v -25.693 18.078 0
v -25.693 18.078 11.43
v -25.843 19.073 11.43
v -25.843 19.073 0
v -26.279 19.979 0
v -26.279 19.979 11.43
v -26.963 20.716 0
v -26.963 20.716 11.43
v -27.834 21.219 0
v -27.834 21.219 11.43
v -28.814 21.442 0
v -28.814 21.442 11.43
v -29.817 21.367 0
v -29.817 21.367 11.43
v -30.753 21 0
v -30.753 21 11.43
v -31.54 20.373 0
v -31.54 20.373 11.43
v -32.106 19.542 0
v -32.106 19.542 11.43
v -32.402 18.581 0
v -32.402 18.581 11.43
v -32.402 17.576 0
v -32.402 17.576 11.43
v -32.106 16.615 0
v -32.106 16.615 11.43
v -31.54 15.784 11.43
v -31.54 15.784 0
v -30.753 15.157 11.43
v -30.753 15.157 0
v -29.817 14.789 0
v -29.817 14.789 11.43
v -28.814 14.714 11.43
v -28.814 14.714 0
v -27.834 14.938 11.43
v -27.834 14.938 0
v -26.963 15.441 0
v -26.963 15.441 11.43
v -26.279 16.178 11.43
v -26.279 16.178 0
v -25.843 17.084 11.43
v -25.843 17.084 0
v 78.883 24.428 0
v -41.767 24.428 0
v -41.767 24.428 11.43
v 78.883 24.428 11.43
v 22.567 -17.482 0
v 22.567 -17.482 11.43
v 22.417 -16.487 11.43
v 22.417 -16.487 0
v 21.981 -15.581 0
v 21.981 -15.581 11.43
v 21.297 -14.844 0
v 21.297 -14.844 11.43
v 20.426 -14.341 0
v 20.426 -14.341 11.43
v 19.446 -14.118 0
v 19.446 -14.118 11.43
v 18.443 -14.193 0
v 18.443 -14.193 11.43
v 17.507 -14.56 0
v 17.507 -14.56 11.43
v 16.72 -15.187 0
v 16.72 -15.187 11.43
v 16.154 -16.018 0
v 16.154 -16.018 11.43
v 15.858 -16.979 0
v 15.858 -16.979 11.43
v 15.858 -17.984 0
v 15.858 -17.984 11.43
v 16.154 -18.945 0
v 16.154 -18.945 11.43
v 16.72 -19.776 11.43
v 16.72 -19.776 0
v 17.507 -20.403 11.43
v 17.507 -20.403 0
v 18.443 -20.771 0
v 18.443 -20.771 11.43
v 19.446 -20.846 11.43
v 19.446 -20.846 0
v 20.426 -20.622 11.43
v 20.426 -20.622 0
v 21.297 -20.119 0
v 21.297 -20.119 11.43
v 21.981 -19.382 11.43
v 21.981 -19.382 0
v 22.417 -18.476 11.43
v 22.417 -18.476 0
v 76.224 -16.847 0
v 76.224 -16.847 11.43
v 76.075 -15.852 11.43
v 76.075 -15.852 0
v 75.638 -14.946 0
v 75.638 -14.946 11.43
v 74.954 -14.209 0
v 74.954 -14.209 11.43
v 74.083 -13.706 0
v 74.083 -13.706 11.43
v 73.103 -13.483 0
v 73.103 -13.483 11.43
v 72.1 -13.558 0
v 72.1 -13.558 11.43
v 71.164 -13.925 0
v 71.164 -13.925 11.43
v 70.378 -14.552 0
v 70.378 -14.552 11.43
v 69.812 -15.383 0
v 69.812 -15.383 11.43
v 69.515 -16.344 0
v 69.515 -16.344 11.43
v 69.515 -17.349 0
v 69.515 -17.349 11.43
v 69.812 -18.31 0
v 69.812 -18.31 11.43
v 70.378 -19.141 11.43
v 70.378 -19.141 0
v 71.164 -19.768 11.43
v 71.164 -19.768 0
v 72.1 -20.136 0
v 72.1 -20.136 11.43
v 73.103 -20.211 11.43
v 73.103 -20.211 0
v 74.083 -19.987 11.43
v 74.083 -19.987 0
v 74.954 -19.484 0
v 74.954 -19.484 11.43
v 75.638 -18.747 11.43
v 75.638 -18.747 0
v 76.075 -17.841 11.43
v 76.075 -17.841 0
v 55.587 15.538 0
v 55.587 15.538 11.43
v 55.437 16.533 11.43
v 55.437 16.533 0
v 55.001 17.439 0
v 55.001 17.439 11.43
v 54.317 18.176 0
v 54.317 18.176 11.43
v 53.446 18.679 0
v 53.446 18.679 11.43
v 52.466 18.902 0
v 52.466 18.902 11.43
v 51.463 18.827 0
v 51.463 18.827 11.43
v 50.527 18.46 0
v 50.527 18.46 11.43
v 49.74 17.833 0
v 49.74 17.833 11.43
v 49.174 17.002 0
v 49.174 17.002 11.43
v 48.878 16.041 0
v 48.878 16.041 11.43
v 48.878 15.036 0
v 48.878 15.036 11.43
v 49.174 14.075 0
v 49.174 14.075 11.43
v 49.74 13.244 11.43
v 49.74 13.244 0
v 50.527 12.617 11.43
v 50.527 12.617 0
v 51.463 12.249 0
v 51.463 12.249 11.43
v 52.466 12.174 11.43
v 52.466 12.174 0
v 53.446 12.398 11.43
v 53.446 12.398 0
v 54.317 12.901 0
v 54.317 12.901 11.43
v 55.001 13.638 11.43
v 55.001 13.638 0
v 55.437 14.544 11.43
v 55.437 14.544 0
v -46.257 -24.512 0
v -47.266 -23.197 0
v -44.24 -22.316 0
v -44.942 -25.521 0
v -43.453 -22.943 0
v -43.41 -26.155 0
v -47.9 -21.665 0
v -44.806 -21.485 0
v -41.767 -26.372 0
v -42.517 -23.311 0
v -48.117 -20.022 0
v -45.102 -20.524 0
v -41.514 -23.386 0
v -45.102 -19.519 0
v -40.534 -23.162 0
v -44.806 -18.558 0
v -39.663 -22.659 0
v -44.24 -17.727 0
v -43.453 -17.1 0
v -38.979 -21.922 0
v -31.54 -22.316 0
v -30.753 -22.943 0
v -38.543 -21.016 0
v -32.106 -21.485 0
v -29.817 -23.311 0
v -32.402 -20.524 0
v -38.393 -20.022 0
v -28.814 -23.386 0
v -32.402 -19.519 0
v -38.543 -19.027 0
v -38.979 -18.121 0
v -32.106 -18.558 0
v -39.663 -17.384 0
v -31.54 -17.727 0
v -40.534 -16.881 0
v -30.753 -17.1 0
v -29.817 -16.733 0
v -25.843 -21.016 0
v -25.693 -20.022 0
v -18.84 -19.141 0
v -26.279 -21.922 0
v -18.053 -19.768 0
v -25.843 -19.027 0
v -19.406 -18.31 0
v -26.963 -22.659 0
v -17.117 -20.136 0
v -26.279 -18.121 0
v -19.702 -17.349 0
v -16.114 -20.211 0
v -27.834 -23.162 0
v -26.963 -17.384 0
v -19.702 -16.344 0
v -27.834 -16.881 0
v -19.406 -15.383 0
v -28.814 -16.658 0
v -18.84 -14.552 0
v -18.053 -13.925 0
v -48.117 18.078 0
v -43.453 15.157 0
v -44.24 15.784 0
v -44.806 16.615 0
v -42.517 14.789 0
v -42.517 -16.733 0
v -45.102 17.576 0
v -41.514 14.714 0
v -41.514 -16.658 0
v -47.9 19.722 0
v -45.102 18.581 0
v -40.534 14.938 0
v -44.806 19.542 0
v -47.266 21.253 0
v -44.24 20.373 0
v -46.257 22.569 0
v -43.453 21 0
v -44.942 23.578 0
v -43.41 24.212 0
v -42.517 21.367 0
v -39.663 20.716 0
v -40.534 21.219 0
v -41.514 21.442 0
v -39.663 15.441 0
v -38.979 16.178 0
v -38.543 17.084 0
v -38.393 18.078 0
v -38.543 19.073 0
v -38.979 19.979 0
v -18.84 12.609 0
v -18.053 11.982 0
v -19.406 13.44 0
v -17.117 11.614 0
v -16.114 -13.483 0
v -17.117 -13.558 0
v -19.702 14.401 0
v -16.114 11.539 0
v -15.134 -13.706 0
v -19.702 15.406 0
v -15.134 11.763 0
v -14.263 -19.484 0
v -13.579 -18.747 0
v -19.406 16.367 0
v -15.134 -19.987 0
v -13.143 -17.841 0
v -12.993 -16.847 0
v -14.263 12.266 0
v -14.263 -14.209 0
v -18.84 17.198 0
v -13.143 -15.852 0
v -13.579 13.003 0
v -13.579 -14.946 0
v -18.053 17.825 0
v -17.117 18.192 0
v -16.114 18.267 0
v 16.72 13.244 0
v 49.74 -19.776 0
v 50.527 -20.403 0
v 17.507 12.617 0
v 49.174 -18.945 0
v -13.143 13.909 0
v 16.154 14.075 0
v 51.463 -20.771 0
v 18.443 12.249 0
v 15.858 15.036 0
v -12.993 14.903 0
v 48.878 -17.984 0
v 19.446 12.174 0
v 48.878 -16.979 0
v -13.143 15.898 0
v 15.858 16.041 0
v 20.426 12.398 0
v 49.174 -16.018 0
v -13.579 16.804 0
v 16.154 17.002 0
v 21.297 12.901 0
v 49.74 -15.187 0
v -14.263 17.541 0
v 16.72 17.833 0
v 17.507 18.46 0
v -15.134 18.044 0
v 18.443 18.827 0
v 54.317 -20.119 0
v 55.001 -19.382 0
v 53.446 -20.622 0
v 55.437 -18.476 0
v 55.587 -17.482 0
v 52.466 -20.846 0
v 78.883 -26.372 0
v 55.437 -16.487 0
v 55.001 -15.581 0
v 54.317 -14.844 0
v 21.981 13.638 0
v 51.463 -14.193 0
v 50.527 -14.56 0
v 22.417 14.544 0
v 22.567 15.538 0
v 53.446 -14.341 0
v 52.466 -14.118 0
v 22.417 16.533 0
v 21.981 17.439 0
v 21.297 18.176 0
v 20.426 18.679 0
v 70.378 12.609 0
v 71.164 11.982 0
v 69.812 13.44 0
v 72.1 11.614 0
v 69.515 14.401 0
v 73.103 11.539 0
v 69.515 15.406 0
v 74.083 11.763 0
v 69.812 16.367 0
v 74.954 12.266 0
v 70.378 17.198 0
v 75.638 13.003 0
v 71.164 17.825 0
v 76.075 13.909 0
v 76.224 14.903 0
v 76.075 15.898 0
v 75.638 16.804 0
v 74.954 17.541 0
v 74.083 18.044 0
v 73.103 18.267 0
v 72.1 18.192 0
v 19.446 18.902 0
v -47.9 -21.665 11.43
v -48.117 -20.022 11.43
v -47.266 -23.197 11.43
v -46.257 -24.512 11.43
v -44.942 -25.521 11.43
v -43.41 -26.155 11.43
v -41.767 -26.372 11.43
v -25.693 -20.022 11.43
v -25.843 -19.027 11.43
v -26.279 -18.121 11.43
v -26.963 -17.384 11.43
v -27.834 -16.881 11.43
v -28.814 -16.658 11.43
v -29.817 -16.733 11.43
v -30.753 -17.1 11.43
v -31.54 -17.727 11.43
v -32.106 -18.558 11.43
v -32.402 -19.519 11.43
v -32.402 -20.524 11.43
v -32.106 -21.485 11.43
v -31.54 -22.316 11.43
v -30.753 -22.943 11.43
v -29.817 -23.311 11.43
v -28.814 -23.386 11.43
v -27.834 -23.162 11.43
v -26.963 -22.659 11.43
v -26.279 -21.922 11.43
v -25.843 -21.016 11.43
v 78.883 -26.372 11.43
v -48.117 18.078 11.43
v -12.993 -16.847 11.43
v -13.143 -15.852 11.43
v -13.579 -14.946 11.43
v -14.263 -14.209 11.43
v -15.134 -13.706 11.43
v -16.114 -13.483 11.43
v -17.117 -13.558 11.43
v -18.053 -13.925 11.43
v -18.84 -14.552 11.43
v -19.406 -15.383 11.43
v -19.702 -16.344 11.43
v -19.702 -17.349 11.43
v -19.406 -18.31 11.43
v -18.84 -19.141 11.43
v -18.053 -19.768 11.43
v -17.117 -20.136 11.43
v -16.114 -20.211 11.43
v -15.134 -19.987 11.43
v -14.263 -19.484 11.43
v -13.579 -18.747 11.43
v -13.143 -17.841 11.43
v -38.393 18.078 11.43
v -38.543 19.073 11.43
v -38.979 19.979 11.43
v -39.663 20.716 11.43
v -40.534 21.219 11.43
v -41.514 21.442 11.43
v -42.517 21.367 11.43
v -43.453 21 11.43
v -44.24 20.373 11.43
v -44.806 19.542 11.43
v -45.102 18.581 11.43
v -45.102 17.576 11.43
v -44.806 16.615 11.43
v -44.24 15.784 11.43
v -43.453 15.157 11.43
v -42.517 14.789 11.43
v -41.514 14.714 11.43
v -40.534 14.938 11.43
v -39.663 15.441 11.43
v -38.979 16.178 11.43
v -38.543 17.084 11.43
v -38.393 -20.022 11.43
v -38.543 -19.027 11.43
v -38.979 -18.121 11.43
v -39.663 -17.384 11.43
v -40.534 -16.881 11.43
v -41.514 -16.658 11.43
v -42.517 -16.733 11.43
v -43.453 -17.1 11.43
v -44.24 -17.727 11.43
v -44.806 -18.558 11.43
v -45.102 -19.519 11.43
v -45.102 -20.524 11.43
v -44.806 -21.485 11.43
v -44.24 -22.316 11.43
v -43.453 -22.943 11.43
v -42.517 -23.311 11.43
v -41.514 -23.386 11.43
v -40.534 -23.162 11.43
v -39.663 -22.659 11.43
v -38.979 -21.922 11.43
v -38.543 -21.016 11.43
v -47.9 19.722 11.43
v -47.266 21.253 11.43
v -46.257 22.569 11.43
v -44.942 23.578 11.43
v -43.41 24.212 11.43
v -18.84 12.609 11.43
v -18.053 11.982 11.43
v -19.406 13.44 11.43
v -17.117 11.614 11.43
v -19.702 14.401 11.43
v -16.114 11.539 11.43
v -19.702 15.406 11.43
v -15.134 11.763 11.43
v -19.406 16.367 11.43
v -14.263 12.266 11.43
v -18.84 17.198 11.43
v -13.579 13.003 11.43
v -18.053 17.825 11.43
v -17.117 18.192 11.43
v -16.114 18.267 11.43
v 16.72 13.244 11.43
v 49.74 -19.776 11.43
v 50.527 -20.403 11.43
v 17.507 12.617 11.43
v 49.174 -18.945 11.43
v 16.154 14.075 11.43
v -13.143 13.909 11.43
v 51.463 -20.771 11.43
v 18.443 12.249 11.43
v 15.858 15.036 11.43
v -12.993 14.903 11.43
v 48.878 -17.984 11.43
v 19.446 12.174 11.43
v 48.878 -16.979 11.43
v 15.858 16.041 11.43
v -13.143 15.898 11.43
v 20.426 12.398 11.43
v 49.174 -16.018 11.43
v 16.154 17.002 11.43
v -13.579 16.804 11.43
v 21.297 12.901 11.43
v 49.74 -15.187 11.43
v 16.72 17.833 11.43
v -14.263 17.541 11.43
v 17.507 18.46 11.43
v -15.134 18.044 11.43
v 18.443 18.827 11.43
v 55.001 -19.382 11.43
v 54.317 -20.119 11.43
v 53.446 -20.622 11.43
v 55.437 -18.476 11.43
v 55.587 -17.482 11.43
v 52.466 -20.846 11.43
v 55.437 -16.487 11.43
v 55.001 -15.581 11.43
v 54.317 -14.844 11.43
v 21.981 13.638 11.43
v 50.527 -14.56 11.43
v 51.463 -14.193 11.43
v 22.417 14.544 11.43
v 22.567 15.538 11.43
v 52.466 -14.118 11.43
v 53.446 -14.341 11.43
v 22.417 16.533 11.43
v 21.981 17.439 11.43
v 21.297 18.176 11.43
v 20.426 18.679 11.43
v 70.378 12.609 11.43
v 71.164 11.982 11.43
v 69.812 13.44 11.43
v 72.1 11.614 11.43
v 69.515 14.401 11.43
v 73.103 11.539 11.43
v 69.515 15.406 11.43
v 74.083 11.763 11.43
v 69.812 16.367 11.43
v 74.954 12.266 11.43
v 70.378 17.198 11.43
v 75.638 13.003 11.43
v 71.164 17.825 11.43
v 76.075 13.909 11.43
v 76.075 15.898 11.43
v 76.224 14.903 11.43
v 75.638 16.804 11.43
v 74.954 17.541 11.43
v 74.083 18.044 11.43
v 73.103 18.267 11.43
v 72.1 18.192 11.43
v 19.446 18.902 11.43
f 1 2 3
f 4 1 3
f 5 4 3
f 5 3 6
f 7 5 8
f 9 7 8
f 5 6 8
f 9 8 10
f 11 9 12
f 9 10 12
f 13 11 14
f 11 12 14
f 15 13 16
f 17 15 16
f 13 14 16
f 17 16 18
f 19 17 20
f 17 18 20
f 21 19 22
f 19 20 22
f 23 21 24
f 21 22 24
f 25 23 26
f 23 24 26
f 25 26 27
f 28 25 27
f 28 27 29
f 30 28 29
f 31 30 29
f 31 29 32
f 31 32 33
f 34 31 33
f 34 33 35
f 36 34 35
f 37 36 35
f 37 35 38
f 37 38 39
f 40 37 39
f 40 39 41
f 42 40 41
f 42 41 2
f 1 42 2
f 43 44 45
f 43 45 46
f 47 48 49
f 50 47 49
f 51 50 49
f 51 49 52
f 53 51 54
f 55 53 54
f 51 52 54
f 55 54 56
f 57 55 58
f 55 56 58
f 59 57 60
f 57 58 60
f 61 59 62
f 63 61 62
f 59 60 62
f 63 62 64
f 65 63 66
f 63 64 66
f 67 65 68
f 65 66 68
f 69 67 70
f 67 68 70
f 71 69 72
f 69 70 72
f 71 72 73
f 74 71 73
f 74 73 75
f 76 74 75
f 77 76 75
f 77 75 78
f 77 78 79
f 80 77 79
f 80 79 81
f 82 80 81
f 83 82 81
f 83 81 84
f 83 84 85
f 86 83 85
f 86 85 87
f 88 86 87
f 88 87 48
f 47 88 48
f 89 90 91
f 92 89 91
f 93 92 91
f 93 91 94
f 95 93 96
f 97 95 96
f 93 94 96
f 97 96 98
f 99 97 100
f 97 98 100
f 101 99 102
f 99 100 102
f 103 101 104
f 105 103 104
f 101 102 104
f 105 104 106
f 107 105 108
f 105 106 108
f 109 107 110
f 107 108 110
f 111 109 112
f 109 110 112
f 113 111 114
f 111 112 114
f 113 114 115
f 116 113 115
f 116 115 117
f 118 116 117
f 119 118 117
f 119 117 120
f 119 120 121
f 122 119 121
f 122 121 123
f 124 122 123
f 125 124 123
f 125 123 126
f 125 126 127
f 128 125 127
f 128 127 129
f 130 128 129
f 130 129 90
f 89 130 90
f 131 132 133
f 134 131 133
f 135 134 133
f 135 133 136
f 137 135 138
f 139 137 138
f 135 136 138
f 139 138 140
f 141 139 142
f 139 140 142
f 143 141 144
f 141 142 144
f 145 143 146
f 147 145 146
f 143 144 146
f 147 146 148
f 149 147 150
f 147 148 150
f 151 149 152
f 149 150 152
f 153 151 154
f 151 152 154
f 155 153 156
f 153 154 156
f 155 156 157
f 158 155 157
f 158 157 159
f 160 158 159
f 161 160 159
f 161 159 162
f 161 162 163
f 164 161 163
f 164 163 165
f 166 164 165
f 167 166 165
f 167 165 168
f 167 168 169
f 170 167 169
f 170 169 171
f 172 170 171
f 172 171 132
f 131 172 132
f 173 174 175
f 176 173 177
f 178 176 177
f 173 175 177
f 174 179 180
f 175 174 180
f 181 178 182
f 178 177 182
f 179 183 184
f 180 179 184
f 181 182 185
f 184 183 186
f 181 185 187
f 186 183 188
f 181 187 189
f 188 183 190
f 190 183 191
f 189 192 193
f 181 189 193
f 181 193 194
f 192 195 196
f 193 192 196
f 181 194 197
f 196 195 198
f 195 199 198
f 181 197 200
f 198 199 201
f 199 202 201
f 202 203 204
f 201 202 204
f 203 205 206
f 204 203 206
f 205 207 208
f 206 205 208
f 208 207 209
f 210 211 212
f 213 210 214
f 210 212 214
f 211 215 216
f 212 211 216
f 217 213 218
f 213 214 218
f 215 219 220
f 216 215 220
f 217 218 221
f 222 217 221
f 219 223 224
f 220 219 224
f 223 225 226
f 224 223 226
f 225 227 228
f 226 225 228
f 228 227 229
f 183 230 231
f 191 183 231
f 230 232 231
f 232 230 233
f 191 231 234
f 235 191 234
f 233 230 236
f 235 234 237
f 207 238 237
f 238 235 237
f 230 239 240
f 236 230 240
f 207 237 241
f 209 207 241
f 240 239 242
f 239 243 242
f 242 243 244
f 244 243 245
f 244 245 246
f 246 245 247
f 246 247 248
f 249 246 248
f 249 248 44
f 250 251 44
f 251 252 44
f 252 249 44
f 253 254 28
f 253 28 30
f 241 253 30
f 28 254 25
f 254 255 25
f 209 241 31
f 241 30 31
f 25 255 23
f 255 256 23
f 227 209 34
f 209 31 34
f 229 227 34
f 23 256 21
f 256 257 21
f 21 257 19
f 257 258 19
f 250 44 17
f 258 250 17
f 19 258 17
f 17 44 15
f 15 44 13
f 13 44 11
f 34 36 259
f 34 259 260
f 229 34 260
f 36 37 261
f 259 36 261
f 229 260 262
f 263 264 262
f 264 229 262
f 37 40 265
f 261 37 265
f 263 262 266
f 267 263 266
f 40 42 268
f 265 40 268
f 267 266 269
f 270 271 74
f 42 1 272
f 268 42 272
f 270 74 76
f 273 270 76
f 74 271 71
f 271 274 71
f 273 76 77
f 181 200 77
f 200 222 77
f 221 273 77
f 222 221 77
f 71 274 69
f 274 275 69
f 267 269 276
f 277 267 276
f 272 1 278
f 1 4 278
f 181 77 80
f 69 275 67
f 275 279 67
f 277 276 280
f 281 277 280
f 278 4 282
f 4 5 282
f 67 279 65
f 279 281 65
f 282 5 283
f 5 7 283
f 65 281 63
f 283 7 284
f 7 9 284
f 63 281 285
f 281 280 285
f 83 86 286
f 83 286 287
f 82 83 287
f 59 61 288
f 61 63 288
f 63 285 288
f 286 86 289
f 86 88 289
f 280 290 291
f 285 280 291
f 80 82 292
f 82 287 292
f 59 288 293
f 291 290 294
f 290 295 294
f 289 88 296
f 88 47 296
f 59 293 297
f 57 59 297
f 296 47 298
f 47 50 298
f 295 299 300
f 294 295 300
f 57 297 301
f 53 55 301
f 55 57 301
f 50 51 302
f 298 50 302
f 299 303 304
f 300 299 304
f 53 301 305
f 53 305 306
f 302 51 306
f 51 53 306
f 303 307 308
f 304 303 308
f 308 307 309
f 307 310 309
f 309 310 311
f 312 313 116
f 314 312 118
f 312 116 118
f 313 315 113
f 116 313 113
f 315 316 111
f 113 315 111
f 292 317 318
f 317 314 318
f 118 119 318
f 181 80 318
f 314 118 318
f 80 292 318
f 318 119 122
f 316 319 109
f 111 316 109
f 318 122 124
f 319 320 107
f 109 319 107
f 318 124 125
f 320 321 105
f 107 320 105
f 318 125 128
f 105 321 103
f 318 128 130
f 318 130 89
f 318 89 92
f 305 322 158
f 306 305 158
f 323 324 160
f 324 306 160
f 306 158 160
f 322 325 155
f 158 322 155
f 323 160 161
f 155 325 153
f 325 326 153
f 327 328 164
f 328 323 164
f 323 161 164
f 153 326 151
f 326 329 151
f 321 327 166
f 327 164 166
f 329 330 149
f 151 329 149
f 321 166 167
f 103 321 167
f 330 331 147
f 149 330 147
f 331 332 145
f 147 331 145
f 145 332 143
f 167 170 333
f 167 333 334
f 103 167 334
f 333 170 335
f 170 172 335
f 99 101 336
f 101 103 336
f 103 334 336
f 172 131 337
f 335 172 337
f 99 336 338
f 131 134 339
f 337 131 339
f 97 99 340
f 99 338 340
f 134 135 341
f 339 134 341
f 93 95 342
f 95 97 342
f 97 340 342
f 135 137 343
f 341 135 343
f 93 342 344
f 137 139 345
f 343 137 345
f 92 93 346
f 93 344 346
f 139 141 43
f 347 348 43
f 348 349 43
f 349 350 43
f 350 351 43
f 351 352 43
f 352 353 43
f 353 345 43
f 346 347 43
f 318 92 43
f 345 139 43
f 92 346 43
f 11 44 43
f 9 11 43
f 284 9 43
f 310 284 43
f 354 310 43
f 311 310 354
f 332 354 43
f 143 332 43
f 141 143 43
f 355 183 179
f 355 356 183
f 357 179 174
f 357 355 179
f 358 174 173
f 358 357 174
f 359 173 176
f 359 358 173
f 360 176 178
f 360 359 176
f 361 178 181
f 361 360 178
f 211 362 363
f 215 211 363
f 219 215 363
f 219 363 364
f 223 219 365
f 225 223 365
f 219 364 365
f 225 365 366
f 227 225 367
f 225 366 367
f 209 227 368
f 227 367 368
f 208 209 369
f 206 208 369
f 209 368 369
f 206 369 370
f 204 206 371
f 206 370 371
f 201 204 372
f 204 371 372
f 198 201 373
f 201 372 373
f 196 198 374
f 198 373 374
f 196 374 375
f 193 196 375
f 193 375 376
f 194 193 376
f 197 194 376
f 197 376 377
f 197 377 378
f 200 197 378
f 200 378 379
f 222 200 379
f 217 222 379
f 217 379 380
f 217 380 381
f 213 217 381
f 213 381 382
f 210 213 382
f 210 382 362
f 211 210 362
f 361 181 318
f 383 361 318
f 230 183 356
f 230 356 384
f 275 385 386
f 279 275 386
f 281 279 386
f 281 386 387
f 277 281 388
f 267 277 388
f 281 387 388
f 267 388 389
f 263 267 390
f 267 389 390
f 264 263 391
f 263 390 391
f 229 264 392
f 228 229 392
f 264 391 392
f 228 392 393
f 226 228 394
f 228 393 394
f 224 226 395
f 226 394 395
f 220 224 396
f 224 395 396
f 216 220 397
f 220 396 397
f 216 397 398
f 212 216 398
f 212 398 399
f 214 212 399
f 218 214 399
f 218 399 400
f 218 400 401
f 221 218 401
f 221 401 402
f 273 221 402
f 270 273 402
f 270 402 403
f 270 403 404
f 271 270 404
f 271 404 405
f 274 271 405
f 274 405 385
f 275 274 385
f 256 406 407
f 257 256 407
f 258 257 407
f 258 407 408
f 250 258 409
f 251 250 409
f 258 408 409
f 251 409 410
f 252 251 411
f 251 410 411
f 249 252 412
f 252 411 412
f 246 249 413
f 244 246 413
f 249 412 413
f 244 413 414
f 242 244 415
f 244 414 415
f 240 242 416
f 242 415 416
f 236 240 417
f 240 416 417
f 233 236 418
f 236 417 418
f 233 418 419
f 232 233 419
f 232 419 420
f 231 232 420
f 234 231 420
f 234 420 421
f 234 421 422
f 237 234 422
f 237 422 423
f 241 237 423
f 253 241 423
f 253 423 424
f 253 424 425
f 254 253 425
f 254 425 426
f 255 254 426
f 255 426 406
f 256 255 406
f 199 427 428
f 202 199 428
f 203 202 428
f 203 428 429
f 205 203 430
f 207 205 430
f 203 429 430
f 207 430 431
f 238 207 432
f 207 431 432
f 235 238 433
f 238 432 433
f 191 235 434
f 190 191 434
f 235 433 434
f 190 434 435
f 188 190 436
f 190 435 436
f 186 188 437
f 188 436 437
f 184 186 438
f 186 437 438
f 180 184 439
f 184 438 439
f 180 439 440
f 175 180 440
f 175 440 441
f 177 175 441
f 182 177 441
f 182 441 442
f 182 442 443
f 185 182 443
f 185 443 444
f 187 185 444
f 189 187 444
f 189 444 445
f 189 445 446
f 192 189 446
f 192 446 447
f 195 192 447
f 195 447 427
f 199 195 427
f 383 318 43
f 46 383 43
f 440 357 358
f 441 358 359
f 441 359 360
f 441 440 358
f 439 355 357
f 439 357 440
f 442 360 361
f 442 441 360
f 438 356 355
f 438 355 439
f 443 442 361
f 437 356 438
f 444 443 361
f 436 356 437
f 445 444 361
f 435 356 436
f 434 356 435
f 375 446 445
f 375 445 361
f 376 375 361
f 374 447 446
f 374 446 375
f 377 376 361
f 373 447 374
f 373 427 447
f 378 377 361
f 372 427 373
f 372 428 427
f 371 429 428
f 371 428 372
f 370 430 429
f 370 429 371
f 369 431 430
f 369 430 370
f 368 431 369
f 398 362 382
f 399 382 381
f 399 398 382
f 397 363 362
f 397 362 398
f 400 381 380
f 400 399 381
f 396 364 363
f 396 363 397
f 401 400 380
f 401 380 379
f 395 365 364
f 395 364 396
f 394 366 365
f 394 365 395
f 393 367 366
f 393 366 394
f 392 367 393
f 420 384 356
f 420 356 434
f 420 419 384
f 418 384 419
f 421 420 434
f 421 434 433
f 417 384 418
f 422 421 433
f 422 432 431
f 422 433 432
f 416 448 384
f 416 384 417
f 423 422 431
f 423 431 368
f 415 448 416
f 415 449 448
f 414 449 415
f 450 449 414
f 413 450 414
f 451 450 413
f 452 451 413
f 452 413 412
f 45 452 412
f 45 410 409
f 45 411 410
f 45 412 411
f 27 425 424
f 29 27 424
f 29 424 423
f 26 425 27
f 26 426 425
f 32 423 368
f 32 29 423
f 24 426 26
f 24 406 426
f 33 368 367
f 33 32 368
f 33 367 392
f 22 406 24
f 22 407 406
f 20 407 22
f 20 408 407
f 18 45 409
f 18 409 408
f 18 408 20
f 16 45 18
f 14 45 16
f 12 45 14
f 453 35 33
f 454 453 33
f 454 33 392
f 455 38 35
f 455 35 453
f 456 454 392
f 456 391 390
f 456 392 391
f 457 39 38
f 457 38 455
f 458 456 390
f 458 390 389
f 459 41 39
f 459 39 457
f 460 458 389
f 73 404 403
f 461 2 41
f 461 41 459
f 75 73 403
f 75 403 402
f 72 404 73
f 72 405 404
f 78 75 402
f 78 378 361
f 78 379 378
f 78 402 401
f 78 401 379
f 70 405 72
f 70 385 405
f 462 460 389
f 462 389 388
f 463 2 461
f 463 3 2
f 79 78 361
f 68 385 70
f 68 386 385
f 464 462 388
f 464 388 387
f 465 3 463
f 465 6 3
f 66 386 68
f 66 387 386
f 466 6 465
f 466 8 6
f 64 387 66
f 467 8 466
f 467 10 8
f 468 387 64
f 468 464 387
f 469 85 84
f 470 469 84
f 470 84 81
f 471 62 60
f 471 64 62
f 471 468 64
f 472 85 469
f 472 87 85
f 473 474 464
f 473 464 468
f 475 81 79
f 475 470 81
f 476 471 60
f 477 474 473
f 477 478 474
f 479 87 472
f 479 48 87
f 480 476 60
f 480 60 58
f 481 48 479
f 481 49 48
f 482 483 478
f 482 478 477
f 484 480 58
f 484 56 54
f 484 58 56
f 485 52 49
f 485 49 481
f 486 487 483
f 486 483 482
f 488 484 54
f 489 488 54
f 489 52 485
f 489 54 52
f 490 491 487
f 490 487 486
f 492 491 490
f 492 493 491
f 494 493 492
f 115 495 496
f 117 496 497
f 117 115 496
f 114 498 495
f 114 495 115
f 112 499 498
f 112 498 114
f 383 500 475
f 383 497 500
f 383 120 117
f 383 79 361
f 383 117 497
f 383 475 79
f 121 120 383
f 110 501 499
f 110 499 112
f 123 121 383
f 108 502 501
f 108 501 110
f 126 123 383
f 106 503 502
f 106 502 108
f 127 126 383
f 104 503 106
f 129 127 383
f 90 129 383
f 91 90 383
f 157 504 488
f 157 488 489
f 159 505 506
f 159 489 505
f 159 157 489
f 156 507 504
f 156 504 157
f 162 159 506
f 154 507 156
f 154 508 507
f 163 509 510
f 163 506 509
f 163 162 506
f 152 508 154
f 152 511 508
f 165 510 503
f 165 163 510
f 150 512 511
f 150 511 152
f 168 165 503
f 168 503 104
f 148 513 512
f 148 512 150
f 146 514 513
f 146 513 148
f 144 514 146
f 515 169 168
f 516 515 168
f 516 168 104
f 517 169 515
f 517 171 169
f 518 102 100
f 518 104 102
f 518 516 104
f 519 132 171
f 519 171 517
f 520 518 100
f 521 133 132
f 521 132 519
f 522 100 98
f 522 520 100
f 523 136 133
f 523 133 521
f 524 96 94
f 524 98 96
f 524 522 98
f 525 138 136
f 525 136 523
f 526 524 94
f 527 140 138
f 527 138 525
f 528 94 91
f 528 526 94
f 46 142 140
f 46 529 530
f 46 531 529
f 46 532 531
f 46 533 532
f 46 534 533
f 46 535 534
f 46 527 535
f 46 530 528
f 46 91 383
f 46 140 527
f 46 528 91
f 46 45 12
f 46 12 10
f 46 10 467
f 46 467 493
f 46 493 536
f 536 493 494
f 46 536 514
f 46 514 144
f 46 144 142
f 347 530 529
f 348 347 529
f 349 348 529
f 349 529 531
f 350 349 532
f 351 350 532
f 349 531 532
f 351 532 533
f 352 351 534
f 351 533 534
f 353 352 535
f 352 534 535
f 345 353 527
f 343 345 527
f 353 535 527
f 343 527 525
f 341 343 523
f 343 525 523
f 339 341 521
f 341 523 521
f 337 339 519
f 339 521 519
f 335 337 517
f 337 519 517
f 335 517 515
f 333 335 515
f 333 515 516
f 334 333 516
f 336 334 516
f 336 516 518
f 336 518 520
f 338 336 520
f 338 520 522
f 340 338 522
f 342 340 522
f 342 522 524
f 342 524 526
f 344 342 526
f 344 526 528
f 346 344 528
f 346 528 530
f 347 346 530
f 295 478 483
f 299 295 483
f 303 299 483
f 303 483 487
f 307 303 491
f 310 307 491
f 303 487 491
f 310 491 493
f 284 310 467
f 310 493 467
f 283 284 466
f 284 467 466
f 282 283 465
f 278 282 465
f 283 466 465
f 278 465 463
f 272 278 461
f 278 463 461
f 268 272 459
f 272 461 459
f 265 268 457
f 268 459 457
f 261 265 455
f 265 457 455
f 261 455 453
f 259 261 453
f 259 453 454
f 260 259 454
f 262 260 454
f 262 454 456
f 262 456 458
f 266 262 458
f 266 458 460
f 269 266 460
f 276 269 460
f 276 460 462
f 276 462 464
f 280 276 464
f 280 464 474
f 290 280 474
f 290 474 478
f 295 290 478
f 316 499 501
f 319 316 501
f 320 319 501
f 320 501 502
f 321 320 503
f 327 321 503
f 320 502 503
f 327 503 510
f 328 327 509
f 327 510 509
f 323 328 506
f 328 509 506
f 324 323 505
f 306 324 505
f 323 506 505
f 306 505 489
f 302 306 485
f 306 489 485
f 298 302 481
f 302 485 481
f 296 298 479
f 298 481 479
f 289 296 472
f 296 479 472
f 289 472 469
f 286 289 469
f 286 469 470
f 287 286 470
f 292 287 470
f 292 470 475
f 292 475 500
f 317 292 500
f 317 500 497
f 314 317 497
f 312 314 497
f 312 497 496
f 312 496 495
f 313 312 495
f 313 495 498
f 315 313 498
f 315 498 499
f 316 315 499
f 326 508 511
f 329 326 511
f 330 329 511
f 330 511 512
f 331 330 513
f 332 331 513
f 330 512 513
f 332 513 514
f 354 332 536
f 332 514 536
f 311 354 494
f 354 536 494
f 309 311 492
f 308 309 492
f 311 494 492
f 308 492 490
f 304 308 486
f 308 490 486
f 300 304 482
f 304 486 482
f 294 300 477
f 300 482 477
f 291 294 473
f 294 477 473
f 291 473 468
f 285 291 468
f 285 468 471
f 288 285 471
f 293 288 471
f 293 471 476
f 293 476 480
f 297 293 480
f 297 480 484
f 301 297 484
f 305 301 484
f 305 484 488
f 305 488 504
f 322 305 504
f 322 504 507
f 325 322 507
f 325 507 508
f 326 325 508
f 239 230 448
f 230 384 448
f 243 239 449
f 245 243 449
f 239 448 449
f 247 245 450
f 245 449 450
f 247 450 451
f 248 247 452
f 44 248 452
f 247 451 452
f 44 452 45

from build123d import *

# Parameters (mm, degrees)
SKETCH2_W                        = 127
SKETCH2_H                        = 50.8
BOSS_EXTRUDE1_DEPTH              = 11.43
FILLET1_R                        = 6.35
F_17_64_0_26563_DIAMETER_HOLE2_D = 6.747002
F_17_64_0_26563_DIAMETER_HOLE3_D = 6.747002
F_17_64_0_26563_DIAMETER_HOLE4_D = 6.747002
F_17_64_0_26563_DIAMETER_HOLE6_D = 6.747002


with BuildPart() as part:
    # Sketch2 → Boss-Extrude1 (new body)
    with BuildSketch(Plane.XY):
        with Locations((15.383424408, -0.971584699)):
            Rectangle(SKETCH2_W, SKETCH2_H)
    extrude(amount=BOSS_EXTRUDE1_DEPTH)

    # Fillet1
    fillet1_edges = [part.edges().sort_by_distance(p)[0] for p in [
        (-48.116575592, 24.428415301, 5.715),
        (-48.116575592, -26.371584699, 5.715),
    ]]
    fillet(fillet1_edges, radius=FILLET1_R)

    # 17/64 (0.26563) Diameter Hole2 (through all)
    with Locations(Plane(origin=(52.213424408, 15.538415301, 0), x_dir=(-1, 0, 0), z_dir=(0, 0, -1))):
        with Locations((0, 0), (33.02, 0), (33.02, -33.02), (0, -33.02)):
            Hole(F_17_64_0_26563_DIAMETER_HOLE2_D / 2)

    # 17/64 (0.26563) Diameter Hole3 (through all)
    with Locations(Plane(origin=(-16.366575592, 14.903415301, 0), x_dir=(-1, 0, 0), z_dir=(0, 0, -1))):
        with Locations((0, 0), (0, -31.75)):
            Hole(F_17_64_0_26563_DIAMETER_HOLE3_D / 2)

    # 17/64 (0.26563) Diameter Hole4 (through all)
    with Locations(Plane(origin=(72.850924408, -16.846584699, 0), x_dir=(-1, 0, 0), z_dir=(0, 0, -1))):
        with Locations((0, 0), (0, 31.75)):
            Hole(F_17_64_0_26563_DIAMETER_HOLE4_D / 2)

    # 17/64 (0.26563) Diameter Hole6 (through all)
    with Locations(Plane(origin=(-29.066575592, 18.078415301, 0), x_dir=(-1, 0, 0), z_dir=(0, 0, -1))):
        with Locations((0, 0), (12.7, 0), (12.7, -38.1), (0, -38.1)):
            Hole(F_17_64_0_26563_DIAMETER_HOLE6_D / 2)


solid = part.part
